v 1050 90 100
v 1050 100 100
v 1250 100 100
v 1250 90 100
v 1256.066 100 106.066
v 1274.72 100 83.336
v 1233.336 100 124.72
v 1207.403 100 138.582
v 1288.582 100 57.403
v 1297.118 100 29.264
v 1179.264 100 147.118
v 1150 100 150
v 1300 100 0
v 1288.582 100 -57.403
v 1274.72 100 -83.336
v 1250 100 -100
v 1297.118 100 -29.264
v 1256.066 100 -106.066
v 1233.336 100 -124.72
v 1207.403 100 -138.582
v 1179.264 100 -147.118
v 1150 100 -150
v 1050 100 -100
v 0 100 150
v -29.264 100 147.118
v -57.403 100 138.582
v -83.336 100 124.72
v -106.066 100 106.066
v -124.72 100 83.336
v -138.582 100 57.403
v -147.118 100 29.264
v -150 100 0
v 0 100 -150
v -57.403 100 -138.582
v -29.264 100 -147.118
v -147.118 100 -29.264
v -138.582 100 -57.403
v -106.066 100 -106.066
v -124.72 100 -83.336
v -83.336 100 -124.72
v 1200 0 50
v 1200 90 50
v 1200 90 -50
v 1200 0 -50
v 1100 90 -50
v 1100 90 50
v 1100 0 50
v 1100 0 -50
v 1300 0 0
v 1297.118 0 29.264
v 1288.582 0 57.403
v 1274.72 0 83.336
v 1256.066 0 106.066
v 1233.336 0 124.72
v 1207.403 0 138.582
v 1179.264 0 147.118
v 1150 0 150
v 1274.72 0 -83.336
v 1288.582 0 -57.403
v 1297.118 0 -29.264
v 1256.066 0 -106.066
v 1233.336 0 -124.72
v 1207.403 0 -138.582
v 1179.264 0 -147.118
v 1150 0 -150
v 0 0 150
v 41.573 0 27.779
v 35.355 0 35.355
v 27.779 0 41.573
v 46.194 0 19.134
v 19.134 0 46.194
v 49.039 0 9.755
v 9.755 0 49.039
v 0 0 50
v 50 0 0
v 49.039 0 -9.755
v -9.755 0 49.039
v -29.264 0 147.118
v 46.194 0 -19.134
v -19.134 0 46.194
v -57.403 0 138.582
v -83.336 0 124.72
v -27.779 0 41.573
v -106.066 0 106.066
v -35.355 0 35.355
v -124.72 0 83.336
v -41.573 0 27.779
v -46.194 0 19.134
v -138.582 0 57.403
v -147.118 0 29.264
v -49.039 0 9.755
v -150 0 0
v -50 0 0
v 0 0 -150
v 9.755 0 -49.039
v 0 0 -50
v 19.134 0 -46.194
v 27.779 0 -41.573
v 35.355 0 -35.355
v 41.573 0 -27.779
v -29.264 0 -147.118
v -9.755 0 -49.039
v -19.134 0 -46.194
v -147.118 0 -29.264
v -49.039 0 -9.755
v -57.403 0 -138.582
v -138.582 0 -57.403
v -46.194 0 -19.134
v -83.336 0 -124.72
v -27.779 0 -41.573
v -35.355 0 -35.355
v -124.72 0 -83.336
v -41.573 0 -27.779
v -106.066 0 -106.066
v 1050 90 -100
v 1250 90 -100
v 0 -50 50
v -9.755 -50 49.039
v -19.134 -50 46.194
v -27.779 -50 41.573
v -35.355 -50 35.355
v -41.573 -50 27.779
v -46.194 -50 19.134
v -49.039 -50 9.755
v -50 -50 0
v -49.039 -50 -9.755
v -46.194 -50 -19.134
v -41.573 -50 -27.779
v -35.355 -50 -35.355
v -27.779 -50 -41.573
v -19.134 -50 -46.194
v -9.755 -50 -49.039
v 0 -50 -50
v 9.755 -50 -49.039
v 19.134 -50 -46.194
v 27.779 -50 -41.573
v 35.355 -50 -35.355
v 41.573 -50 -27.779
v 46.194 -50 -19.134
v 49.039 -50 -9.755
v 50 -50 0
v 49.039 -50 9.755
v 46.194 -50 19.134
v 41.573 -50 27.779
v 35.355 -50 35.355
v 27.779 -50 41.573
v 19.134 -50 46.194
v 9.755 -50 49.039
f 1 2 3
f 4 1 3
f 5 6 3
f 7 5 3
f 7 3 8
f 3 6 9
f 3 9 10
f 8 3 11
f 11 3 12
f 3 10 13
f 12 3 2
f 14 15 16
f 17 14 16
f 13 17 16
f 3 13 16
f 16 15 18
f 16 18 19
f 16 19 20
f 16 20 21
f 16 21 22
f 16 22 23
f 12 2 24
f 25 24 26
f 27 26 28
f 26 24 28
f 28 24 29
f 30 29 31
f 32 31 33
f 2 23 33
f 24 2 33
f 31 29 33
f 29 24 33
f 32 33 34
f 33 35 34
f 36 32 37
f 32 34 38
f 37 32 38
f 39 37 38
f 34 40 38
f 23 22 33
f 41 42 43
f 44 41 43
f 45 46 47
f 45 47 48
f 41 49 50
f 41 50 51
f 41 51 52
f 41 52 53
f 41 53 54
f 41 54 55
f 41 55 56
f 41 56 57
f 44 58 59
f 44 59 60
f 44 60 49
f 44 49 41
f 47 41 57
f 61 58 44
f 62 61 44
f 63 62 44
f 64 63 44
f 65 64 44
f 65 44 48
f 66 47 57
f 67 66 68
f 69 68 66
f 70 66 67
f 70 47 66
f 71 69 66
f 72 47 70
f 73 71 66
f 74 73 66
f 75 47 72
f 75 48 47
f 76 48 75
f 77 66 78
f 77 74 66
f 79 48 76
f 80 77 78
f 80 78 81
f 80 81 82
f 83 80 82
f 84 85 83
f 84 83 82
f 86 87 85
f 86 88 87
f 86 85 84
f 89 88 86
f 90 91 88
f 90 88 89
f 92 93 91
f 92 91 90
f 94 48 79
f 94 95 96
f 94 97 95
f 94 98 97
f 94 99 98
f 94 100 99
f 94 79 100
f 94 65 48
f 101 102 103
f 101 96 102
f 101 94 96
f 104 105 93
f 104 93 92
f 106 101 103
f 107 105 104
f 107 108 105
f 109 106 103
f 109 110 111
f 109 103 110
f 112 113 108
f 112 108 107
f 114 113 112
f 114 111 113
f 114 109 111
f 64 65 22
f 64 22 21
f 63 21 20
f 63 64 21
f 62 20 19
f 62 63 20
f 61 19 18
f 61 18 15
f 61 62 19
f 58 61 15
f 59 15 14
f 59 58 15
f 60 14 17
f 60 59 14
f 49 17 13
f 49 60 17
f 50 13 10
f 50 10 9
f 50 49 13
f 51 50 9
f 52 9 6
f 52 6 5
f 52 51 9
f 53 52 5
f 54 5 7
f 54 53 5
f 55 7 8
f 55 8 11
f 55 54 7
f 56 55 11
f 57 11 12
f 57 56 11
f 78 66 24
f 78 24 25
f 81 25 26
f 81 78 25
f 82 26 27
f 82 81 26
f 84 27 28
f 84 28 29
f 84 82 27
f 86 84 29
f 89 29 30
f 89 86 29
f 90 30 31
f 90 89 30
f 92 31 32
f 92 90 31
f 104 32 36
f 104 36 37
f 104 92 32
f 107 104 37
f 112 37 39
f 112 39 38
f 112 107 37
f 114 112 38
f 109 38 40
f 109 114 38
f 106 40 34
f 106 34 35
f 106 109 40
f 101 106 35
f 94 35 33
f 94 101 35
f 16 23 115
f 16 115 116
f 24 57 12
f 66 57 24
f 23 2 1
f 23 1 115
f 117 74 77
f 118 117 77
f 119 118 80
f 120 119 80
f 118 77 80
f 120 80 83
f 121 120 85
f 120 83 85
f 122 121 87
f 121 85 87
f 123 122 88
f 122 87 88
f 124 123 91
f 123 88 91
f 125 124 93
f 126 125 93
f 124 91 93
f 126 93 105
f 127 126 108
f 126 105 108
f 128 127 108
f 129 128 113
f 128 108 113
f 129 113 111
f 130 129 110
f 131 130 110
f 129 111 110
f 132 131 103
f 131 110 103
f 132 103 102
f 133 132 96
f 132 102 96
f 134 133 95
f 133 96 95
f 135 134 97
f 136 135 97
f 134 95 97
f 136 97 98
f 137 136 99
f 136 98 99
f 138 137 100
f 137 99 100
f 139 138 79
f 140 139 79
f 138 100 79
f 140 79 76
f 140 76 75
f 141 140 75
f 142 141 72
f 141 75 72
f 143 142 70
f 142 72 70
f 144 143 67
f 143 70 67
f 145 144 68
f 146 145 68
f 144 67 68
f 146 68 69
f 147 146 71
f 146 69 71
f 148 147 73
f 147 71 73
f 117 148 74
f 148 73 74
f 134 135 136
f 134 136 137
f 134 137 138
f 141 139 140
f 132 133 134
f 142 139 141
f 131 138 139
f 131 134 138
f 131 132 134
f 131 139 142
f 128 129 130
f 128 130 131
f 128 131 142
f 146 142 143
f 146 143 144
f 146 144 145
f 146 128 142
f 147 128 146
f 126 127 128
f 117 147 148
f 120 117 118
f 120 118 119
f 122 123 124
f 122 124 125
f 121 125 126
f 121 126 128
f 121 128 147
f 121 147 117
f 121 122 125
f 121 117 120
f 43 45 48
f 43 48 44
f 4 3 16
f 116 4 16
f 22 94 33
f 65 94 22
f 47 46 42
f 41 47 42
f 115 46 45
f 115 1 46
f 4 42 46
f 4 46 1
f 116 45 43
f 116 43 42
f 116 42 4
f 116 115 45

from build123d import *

# Parameters (mm, degrees)
BOSS_EXTRUDE1_DEPTH = 100
SKETCH3_R           = 50
BOSS_EXTRUDE3_DEPTH = 50
SKETCH2_W           = 100
SKETCH2_H           = 100
CUT_EXTRUDE1_DEPTH  = 100
SKETCH4_W           = 200
SKETCH4_H           = 200
CUT_EXTRUDE2_DEPTH  = 10


with BuildPart() as part:
    # Sketch1 → Boss-Extrude1 (new body)
    with BuildSketch(Plane(origin=(0, 0, 0), x_dir=(1, 0, 0), z_dir=(0, 1, 0))):
        with BuildLine():
            Line((0, 150), (1150, 150))
            ThreePointArc((1150, 150), (1300, 0), (1150, -150))
            Line((1150, -150), (0, -150))
            ThreePointArc((0, -150), (-150, 0), (0, 150))
        make_face()
    extrude(amount=BOSS_EXTRUDE1_DEPTH)

    # Sketch3 → Boss-Extrude3 (add)
    with BuildSketch(Plane.XZ):
        with Locations(Location((0, 0, 0), (0, 0, 90))):
            Circle(SKETCH3_R)
    extrude(amount=BOSS_EXTRUDE3_DEPTH)

    # Sketch2 → Cut-Extrude1 (cut)
    with BuildSketch(Plane(origin=(0, 100, 0), x_dir=(1, 0, 0), z_dir=(0, 1, 0))):
        with Locations((1150, 0)):
            Rectangle(SKETCH2_W, SKETCH2_H)
    extrude(amount=-CUT_EXTRUDE1_DEPTH, mode=Mode.SUBTRACT)

    # Sketch4 → Cut-Extrude2 (cut)
    with BuildSketch(Plane(origin=(0, 100, 0), x_dir=(1, 0, 0), z_dir=(0, 1, 0))):
        with Locations((1150, 0)):
            Rectangle(SKETCH4_W, SKETCH4_H)
    extrude(amount=-CUT_EXTRUDE2_DEPTH, mode=Mode.SUBTRACT)


solid = part.part
